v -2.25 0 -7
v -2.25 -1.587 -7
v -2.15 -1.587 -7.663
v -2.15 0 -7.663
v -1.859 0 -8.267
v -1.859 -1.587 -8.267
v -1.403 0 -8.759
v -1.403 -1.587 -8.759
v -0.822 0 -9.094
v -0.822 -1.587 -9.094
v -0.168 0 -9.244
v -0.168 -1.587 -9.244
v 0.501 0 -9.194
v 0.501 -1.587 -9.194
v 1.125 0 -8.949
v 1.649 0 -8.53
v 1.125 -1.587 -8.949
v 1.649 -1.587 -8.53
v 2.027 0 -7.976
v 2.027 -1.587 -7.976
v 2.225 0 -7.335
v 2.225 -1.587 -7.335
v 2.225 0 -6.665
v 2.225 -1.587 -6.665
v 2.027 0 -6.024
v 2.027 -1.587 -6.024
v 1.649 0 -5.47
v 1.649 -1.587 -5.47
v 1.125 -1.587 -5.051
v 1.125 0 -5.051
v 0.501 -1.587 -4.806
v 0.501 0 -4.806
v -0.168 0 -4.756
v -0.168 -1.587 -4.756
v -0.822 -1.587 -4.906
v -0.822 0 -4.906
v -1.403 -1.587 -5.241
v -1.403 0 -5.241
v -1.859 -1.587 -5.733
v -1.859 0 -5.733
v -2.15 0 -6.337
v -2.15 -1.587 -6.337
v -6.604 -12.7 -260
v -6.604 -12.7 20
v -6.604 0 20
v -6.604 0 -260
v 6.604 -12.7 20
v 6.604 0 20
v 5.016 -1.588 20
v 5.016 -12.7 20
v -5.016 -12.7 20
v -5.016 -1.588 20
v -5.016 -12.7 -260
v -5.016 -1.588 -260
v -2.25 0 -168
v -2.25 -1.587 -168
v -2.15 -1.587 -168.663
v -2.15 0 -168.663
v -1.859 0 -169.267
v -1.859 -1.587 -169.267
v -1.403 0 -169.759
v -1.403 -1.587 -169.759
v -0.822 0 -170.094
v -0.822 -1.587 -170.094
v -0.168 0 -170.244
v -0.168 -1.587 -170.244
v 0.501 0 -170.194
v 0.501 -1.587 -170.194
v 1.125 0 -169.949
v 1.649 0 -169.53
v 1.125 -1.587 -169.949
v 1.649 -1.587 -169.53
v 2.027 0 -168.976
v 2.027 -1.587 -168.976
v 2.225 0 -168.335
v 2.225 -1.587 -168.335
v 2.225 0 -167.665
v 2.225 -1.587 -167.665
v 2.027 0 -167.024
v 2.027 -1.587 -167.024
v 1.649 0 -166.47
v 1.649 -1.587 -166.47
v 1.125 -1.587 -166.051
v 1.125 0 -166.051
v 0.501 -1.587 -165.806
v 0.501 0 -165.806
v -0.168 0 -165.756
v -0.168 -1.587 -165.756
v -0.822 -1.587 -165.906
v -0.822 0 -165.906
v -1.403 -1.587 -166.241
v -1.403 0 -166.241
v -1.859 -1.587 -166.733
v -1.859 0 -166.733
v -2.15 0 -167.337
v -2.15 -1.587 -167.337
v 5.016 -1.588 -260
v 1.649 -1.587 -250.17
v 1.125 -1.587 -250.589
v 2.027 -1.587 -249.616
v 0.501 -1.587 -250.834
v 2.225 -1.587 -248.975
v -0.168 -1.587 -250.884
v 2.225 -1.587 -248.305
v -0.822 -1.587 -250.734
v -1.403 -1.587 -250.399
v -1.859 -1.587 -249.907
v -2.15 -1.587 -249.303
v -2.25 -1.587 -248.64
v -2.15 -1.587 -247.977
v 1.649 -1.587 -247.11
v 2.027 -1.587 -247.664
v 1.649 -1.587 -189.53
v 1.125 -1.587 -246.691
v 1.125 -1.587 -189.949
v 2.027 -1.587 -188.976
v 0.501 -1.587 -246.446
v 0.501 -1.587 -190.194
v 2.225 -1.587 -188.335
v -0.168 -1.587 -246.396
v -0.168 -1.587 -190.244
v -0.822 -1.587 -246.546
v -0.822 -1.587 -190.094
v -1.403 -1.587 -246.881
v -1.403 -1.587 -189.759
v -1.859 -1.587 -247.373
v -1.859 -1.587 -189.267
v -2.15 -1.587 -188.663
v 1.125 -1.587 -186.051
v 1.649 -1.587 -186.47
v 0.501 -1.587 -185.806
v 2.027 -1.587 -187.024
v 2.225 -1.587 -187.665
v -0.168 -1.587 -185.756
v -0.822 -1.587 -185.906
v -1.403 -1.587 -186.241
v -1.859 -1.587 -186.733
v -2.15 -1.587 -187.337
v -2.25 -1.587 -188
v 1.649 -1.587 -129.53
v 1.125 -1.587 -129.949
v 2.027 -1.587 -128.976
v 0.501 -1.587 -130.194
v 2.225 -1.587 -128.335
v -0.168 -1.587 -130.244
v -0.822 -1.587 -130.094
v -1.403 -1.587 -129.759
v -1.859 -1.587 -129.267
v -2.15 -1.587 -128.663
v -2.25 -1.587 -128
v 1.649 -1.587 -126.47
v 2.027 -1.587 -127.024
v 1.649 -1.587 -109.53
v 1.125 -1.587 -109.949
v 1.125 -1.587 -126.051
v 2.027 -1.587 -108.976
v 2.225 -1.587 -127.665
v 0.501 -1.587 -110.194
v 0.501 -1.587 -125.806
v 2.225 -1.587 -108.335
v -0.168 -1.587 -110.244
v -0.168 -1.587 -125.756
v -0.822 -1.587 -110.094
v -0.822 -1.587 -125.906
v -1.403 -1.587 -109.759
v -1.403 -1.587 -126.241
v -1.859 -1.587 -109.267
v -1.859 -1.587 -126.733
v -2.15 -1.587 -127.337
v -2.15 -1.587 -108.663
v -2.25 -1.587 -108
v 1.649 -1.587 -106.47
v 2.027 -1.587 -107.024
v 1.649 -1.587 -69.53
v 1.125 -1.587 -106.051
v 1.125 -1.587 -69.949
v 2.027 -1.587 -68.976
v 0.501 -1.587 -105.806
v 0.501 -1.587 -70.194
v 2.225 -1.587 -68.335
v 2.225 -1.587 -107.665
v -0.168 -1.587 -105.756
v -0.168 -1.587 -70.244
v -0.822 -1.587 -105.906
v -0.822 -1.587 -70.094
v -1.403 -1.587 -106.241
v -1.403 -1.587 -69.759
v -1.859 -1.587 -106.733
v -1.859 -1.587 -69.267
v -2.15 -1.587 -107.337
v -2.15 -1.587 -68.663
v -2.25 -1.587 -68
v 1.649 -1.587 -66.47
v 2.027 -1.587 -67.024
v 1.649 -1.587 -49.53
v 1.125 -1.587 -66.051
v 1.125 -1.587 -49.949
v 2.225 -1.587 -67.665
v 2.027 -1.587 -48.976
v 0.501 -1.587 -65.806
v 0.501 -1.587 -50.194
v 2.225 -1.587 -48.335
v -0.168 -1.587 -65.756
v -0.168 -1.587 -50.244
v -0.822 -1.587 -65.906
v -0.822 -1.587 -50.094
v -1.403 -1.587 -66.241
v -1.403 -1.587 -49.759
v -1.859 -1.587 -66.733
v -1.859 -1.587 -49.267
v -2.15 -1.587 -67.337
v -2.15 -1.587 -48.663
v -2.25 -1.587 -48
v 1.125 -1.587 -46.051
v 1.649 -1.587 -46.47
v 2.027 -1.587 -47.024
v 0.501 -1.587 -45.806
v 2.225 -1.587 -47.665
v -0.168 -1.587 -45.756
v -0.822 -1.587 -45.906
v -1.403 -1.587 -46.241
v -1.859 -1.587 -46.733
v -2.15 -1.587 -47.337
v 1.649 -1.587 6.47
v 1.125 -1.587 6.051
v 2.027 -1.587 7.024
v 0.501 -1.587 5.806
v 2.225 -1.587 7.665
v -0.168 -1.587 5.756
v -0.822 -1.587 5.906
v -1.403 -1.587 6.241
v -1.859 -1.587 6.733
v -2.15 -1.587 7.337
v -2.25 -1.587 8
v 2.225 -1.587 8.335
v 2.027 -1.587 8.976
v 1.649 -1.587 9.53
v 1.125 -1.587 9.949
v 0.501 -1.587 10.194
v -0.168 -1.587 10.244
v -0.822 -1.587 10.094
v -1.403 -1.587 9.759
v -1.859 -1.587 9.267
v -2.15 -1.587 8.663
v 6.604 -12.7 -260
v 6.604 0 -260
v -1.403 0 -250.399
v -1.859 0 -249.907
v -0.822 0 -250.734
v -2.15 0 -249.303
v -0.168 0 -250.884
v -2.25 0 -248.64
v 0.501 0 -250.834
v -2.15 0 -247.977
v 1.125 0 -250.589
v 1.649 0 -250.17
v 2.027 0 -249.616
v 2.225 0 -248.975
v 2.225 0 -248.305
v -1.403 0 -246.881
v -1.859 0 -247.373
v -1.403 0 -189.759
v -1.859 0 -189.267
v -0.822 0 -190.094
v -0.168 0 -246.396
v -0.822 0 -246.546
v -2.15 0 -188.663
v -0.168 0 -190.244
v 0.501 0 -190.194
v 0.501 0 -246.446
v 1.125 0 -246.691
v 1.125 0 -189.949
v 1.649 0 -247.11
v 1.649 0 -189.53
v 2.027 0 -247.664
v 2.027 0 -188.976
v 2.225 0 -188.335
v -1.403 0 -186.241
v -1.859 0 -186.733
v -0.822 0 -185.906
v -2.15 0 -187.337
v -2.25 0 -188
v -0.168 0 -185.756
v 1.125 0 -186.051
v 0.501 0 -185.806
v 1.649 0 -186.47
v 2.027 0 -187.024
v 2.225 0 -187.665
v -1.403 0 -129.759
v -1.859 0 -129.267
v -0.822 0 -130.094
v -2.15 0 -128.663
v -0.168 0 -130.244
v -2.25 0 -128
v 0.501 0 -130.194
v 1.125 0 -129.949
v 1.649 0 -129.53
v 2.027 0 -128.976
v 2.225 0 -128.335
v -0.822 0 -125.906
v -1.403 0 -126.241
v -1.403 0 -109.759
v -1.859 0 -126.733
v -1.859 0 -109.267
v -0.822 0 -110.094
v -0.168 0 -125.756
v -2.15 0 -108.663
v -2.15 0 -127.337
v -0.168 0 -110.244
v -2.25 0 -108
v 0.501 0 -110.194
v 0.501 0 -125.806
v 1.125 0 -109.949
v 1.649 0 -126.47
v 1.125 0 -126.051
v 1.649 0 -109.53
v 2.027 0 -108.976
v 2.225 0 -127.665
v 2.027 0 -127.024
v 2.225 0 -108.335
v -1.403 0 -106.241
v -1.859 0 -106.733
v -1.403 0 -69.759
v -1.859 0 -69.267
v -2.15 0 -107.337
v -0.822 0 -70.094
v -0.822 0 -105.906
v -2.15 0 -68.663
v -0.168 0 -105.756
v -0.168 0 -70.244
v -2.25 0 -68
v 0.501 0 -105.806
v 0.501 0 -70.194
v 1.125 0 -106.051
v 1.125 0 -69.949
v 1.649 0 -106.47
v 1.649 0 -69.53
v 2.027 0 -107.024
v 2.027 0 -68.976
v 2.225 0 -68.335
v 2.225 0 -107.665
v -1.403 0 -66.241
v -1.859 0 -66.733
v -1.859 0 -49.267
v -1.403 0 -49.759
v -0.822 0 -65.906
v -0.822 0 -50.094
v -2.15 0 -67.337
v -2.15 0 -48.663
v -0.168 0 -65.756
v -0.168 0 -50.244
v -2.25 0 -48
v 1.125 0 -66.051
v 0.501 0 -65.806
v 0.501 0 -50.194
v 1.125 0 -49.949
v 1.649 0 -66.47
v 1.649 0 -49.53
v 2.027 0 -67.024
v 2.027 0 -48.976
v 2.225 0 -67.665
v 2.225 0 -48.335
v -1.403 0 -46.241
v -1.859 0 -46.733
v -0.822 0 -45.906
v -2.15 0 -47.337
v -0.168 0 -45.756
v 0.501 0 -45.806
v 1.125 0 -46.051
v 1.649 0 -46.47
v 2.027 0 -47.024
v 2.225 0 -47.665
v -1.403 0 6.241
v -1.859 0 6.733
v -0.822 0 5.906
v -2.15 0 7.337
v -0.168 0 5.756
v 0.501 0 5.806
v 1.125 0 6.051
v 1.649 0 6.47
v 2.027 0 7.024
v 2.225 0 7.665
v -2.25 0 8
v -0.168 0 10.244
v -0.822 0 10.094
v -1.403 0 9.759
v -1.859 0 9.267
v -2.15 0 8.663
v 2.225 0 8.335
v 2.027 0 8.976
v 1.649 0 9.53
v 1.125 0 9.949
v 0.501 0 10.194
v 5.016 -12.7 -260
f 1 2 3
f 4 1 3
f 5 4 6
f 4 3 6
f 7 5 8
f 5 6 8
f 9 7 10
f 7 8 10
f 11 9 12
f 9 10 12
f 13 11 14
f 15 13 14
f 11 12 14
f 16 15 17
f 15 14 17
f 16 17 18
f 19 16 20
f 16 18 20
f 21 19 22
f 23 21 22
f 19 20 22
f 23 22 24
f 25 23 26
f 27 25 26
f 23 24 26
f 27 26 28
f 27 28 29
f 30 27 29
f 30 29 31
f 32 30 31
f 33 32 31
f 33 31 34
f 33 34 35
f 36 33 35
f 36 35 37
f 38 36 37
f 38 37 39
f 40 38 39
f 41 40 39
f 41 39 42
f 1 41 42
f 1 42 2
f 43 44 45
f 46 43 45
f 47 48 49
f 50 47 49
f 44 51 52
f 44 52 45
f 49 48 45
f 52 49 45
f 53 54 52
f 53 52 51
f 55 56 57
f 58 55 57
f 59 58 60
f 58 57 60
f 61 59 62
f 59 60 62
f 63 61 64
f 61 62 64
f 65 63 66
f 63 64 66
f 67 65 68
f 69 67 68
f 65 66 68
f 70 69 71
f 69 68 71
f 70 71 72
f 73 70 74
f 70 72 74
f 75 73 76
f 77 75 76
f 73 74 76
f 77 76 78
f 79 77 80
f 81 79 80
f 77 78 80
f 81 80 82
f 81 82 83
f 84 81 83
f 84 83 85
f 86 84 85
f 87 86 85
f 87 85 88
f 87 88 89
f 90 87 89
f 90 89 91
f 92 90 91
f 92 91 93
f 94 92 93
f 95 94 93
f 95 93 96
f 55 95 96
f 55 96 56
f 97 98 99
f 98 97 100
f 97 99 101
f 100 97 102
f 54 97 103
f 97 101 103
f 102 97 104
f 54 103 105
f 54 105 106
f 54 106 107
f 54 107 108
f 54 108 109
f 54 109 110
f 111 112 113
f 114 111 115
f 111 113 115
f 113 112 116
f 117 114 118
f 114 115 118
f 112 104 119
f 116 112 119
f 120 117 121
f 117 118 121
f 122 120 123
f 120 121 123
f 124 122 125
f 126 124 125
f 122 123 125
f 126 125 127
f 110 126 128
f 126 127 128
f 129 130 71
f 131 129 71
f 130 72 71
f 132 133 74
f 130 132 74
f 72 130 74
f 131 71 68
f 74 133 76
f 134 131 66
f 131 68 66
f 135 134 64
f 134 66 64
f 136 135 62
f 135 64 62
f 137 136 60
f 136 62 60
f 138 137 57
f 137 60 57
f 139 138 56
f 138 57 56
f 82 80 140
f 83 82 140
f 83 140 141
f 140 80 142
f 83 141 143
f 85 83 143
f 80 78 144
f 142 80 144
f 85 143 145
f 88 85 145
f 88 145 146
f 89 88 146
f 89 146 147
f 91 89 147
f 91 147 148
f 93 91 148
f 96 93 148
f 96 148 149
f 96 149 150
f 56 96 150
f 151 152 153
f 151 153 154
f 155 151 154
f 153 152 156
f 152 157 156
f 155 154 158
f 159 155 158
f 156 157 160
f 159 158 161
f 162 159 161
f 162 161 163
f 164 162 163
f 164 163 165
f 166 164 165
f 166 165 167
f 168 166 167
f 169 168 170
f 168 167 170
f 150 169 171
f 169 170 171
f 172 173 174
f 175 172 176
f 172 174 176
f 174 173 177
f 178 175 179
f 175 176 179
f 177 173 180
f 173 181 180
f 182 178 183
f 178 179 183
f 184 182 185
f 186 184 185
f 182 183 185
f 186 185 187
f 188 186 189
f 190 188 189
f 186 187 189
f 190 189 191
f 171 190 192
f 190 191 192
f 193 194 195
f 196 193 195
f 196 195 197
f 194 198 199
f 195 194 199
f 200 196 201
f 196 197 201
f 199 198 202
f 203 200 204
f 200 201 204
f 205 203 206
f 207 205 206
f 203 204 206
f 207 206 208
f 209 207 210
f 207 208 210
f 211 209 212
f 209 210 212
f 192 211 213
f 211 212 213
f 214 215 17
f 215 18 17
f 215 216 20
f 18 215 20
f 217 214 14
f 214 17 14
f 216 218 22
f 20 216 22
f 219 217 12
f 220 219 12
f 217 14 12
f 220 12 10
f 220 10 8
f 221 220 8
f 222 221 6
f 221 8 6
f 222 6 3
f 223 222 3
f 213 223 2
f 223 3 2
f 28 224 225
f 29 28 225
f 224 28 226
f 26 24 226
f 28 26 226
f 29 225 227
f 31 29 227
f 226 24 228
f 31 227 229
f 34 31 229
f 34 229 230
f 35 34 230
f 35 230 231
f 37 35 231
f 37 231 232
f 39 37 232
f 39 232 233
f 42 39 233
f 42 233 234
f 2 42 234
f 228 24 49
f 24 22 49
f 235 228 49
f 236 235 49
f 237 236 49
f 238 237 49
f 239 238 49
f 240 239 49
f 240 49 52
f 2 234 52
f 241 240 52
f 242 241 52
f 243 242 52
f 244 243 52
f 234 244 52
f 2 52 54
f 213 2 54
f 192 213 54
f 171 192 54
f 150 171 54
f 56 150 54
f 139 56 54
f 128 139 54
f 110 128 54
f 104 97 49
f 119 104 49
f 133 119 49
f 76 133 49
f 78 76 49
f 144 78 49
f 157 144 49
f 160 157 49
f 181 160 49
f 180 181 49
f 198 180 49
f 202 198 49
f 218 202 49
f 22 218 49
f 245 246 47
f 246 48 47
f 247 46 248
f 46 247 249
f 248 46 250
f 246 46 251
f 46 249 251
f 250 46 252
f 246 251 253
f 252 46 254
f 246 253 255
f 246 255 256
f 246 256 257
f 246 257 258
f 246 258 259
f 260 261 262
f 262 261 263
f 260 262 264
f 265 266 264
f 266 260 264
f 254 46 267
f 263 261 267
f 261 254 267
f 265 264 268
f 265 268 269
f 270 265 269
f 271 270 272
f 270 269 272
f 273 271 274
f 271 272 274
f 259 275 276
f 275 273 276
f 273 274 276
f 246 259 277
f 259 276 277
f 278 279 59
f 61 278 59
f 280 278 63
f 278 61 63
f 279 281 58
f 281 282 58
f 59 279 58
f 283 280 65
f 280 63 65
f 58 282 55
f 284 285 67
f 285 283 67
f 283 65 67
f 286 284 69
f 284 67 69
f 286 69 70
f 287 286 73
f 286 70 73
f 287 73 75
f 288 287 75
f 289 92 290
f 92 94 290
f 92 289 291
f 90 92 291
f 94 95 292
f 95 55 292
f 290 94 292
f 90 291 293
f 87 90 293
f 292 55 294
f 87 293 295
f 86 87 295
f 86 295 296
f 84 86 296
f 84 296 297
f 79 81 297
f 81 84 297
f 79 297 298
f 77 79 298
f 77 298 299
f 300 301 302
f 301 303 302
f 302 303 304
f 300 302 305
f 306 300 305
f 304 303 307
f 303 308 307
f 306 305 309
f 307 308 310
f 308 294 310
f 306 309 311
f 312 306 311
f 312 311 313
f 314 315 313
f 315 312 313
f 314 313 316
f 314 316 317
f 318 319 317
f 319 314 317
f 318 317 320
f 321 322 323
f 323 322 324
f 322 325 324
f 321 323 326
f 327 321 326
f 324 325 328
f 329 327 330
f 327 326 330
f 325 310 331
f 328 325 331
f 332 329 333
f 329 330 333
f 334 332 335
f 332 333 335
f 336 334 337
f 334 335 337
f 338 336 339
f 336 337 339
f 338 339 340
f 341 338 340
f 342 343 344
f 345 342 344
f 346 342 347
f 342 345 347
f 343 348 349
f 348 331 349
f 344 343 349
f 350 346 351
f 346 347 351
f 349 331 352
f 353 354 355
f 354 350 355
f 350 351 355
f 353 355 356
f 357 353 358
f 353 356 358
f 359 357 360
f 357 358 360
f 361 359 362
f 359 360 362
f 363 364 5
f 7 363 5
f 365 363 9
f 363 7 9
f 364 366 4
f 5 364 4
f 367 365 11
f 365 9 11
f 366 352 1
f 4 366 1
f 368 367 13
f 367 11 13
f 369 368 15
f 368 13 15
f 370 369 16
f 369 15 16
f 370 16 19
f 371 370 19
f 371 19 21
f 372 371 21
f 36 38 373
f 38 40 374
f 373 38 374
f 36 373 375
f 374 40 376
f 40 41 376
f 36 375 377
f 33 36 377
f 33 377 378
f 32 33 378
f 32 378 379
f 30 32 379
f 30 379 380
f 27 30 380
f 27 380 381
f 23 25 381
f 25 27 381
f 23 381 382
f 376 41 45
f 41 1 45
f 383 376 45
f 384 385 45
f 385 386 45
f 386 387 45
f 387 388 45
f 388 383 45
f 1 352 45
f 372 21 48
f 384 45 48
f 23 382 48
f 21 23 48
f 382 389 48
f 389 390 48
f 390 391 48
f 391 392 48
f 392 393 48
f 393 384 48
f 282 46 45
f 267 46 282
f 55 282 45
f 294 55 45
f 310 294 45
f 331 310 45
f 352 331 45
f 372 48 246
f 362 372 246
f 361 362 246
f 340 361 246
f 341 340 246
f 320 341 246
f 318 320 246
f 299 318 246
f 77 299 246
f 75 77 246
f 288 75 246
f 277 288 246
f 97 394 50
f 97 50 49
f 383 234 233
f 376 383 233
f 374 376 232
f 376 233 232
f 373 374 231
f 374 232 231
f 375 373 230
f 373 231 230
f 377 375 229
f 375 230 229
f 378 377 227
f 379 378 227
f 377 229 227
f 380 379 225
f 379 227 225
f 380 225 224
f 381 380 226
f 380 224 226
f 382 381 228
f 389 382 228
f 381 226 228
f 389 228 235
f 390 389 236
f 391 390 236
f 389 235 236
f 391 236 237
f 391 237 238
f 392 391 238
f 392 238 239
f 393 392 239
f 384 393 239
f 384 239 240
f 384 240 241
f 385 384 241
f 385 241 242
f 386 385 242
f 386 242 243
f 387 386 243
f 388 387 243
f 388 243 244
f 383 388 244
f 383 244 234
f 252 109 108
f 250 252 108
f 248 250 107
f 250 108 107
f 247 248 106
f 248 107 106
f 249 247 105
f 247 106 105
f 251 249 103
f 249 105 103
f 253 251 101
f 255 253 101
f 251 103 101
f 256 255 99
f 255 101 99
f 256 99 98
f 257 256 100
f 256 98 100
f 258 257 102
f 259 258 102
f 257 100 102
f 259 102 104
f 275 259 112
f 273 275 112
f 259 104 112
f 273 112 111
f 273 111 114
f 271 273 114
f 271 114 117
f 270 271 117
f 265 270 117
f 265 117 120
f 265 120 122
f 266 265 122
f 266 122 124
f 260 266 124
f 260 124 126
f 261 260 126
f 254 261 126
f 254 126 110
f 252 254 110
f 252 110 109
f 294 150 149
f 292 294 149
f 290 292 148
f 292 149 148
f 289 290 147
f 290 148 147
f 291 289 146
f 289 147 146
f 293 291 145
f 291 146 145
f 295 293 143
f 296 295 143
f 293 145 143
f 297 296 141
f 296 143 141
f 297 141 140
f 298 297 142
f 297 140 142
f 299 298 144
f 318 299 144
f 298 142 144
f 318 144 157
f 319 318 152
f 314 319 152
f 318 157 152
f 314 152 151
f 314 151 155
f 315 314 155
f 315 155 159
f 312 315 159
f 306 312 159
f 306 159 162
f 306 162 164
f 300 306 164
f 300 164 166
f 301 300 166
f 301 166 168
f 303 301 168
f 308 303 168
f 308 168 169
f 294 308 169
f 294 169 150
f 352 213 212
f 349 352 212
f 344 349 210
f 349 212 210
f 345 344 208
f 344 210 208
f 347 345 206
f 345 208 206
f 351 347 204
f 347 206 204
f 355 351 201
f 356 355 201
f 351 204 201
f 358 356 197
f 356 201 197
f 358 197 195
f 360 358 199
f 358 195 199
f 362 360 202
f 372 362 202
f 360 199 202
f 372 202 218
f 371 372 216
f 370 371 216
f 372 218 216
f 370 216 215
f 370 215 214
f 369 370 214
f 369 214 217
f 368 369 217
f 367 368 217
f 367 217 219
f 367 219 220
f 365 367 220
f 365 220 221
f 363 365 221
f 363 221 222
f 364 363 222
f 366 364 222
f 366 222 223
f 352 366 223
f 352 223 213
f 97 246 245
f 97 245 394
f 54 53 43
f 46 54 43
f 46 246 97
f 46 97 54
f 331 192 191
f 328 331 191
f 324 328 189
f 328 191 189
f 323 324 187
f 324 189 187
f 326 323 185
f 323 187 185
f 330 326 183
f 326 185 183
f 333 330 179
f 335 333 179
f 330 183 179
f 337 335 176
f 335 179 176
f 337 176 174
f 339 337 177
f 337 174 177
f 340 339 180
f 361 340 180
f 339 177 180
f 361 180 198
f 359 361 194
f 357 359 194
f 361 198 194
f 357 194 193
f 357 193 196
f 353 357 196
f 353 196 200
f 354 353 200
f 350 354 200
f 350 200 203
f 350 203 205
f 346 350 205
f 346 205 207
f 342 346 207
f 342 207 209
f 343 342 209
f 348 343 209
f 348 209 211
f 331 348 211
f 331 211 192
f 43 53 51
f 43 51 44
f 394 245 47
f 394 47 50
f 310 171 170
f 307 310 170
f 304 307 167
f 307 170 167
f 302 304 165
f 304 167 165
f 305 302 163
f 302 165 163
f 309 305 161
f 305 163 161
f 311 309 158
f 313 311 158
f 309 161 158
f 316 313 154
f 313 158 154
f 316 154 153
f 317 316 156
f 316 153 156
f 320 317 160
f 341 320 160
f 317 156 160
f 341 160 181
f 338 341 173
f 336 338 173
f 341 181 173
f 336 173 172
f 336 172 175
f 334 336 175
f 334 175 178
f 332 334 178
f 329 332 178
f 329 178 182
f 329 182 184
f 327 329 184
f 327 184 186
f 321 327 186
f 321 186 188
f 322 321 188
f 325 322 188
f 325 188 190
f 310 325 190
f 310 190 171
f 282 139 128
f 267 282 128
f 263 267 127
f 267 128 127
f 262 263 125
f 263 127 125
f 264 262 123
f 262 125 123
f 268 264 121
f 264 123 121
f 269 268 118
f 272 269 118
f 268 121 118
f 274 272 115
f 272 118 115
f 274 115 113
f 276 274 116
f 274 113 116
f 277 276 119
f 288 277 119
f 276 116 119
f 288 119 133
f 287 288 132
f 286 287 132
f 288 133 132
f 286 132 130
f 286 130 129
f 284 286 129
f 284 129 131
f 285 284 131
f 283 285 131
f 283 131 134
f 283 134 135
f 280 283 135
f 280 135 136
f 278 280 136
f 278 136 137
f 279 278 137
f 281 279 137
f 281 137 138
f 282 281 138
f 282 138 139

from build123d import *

# Parameters (mm, degrees)
BOSS_EXTRUDE1_DEPTH      = 20
BOSS_EXTRUDE1_DEPTH_BACK = 260
M4_CLEARANCE_HOLE1_D     = 4.5
M4_CLEARANCE_HOLE2_D     = 4.5


with BuildPart() as part:
    # Sketch1 → Boss-Extrude1 (new body, two sides)
    with BuildSketch(Plane.XY) as boss_extrude1_sk:
        Polygon((-6.604, 0), (6.604, 0), (6.604, -12.7), (5.0165, -12.7), (5.0165, -1.5875), (-5.0165, -1.5875), (-5.0165, -12.7), (-6.604, -12.7), align=None)
    extrude(amount=BOSS_EXTRUDE1_DEPTH)
    extrude(boss_extrude1_sk.sketch, amount=-BOSS_EXTRUDE1_DEPTH_BACK)

    # M4 Clearance Hole1 (through all)
    with Locations(Plane(origin=(0, 0, 0), x_dir=(1, 0, 0), z_dir=(0, 1, 0))):
        with Locations((0, 7), (0, 248.64)):
            Hole(M4_CLEARANCE_HOLE1_D / 2)

    # M4 Clearance Hole2 (through all)
    with Locations(Plane(origin=(0, 0, 0), x_dir=(1, 0, 0), z_dir=(0, 1, 0))):
        with Locations((0, 108), (0, 128), (0, -8), (0, 188), (0, 168), (0, 68), (0, 48)):
            Hole(M4_CLEARANCE_HOLE2_D / 2)


solid = part.part
